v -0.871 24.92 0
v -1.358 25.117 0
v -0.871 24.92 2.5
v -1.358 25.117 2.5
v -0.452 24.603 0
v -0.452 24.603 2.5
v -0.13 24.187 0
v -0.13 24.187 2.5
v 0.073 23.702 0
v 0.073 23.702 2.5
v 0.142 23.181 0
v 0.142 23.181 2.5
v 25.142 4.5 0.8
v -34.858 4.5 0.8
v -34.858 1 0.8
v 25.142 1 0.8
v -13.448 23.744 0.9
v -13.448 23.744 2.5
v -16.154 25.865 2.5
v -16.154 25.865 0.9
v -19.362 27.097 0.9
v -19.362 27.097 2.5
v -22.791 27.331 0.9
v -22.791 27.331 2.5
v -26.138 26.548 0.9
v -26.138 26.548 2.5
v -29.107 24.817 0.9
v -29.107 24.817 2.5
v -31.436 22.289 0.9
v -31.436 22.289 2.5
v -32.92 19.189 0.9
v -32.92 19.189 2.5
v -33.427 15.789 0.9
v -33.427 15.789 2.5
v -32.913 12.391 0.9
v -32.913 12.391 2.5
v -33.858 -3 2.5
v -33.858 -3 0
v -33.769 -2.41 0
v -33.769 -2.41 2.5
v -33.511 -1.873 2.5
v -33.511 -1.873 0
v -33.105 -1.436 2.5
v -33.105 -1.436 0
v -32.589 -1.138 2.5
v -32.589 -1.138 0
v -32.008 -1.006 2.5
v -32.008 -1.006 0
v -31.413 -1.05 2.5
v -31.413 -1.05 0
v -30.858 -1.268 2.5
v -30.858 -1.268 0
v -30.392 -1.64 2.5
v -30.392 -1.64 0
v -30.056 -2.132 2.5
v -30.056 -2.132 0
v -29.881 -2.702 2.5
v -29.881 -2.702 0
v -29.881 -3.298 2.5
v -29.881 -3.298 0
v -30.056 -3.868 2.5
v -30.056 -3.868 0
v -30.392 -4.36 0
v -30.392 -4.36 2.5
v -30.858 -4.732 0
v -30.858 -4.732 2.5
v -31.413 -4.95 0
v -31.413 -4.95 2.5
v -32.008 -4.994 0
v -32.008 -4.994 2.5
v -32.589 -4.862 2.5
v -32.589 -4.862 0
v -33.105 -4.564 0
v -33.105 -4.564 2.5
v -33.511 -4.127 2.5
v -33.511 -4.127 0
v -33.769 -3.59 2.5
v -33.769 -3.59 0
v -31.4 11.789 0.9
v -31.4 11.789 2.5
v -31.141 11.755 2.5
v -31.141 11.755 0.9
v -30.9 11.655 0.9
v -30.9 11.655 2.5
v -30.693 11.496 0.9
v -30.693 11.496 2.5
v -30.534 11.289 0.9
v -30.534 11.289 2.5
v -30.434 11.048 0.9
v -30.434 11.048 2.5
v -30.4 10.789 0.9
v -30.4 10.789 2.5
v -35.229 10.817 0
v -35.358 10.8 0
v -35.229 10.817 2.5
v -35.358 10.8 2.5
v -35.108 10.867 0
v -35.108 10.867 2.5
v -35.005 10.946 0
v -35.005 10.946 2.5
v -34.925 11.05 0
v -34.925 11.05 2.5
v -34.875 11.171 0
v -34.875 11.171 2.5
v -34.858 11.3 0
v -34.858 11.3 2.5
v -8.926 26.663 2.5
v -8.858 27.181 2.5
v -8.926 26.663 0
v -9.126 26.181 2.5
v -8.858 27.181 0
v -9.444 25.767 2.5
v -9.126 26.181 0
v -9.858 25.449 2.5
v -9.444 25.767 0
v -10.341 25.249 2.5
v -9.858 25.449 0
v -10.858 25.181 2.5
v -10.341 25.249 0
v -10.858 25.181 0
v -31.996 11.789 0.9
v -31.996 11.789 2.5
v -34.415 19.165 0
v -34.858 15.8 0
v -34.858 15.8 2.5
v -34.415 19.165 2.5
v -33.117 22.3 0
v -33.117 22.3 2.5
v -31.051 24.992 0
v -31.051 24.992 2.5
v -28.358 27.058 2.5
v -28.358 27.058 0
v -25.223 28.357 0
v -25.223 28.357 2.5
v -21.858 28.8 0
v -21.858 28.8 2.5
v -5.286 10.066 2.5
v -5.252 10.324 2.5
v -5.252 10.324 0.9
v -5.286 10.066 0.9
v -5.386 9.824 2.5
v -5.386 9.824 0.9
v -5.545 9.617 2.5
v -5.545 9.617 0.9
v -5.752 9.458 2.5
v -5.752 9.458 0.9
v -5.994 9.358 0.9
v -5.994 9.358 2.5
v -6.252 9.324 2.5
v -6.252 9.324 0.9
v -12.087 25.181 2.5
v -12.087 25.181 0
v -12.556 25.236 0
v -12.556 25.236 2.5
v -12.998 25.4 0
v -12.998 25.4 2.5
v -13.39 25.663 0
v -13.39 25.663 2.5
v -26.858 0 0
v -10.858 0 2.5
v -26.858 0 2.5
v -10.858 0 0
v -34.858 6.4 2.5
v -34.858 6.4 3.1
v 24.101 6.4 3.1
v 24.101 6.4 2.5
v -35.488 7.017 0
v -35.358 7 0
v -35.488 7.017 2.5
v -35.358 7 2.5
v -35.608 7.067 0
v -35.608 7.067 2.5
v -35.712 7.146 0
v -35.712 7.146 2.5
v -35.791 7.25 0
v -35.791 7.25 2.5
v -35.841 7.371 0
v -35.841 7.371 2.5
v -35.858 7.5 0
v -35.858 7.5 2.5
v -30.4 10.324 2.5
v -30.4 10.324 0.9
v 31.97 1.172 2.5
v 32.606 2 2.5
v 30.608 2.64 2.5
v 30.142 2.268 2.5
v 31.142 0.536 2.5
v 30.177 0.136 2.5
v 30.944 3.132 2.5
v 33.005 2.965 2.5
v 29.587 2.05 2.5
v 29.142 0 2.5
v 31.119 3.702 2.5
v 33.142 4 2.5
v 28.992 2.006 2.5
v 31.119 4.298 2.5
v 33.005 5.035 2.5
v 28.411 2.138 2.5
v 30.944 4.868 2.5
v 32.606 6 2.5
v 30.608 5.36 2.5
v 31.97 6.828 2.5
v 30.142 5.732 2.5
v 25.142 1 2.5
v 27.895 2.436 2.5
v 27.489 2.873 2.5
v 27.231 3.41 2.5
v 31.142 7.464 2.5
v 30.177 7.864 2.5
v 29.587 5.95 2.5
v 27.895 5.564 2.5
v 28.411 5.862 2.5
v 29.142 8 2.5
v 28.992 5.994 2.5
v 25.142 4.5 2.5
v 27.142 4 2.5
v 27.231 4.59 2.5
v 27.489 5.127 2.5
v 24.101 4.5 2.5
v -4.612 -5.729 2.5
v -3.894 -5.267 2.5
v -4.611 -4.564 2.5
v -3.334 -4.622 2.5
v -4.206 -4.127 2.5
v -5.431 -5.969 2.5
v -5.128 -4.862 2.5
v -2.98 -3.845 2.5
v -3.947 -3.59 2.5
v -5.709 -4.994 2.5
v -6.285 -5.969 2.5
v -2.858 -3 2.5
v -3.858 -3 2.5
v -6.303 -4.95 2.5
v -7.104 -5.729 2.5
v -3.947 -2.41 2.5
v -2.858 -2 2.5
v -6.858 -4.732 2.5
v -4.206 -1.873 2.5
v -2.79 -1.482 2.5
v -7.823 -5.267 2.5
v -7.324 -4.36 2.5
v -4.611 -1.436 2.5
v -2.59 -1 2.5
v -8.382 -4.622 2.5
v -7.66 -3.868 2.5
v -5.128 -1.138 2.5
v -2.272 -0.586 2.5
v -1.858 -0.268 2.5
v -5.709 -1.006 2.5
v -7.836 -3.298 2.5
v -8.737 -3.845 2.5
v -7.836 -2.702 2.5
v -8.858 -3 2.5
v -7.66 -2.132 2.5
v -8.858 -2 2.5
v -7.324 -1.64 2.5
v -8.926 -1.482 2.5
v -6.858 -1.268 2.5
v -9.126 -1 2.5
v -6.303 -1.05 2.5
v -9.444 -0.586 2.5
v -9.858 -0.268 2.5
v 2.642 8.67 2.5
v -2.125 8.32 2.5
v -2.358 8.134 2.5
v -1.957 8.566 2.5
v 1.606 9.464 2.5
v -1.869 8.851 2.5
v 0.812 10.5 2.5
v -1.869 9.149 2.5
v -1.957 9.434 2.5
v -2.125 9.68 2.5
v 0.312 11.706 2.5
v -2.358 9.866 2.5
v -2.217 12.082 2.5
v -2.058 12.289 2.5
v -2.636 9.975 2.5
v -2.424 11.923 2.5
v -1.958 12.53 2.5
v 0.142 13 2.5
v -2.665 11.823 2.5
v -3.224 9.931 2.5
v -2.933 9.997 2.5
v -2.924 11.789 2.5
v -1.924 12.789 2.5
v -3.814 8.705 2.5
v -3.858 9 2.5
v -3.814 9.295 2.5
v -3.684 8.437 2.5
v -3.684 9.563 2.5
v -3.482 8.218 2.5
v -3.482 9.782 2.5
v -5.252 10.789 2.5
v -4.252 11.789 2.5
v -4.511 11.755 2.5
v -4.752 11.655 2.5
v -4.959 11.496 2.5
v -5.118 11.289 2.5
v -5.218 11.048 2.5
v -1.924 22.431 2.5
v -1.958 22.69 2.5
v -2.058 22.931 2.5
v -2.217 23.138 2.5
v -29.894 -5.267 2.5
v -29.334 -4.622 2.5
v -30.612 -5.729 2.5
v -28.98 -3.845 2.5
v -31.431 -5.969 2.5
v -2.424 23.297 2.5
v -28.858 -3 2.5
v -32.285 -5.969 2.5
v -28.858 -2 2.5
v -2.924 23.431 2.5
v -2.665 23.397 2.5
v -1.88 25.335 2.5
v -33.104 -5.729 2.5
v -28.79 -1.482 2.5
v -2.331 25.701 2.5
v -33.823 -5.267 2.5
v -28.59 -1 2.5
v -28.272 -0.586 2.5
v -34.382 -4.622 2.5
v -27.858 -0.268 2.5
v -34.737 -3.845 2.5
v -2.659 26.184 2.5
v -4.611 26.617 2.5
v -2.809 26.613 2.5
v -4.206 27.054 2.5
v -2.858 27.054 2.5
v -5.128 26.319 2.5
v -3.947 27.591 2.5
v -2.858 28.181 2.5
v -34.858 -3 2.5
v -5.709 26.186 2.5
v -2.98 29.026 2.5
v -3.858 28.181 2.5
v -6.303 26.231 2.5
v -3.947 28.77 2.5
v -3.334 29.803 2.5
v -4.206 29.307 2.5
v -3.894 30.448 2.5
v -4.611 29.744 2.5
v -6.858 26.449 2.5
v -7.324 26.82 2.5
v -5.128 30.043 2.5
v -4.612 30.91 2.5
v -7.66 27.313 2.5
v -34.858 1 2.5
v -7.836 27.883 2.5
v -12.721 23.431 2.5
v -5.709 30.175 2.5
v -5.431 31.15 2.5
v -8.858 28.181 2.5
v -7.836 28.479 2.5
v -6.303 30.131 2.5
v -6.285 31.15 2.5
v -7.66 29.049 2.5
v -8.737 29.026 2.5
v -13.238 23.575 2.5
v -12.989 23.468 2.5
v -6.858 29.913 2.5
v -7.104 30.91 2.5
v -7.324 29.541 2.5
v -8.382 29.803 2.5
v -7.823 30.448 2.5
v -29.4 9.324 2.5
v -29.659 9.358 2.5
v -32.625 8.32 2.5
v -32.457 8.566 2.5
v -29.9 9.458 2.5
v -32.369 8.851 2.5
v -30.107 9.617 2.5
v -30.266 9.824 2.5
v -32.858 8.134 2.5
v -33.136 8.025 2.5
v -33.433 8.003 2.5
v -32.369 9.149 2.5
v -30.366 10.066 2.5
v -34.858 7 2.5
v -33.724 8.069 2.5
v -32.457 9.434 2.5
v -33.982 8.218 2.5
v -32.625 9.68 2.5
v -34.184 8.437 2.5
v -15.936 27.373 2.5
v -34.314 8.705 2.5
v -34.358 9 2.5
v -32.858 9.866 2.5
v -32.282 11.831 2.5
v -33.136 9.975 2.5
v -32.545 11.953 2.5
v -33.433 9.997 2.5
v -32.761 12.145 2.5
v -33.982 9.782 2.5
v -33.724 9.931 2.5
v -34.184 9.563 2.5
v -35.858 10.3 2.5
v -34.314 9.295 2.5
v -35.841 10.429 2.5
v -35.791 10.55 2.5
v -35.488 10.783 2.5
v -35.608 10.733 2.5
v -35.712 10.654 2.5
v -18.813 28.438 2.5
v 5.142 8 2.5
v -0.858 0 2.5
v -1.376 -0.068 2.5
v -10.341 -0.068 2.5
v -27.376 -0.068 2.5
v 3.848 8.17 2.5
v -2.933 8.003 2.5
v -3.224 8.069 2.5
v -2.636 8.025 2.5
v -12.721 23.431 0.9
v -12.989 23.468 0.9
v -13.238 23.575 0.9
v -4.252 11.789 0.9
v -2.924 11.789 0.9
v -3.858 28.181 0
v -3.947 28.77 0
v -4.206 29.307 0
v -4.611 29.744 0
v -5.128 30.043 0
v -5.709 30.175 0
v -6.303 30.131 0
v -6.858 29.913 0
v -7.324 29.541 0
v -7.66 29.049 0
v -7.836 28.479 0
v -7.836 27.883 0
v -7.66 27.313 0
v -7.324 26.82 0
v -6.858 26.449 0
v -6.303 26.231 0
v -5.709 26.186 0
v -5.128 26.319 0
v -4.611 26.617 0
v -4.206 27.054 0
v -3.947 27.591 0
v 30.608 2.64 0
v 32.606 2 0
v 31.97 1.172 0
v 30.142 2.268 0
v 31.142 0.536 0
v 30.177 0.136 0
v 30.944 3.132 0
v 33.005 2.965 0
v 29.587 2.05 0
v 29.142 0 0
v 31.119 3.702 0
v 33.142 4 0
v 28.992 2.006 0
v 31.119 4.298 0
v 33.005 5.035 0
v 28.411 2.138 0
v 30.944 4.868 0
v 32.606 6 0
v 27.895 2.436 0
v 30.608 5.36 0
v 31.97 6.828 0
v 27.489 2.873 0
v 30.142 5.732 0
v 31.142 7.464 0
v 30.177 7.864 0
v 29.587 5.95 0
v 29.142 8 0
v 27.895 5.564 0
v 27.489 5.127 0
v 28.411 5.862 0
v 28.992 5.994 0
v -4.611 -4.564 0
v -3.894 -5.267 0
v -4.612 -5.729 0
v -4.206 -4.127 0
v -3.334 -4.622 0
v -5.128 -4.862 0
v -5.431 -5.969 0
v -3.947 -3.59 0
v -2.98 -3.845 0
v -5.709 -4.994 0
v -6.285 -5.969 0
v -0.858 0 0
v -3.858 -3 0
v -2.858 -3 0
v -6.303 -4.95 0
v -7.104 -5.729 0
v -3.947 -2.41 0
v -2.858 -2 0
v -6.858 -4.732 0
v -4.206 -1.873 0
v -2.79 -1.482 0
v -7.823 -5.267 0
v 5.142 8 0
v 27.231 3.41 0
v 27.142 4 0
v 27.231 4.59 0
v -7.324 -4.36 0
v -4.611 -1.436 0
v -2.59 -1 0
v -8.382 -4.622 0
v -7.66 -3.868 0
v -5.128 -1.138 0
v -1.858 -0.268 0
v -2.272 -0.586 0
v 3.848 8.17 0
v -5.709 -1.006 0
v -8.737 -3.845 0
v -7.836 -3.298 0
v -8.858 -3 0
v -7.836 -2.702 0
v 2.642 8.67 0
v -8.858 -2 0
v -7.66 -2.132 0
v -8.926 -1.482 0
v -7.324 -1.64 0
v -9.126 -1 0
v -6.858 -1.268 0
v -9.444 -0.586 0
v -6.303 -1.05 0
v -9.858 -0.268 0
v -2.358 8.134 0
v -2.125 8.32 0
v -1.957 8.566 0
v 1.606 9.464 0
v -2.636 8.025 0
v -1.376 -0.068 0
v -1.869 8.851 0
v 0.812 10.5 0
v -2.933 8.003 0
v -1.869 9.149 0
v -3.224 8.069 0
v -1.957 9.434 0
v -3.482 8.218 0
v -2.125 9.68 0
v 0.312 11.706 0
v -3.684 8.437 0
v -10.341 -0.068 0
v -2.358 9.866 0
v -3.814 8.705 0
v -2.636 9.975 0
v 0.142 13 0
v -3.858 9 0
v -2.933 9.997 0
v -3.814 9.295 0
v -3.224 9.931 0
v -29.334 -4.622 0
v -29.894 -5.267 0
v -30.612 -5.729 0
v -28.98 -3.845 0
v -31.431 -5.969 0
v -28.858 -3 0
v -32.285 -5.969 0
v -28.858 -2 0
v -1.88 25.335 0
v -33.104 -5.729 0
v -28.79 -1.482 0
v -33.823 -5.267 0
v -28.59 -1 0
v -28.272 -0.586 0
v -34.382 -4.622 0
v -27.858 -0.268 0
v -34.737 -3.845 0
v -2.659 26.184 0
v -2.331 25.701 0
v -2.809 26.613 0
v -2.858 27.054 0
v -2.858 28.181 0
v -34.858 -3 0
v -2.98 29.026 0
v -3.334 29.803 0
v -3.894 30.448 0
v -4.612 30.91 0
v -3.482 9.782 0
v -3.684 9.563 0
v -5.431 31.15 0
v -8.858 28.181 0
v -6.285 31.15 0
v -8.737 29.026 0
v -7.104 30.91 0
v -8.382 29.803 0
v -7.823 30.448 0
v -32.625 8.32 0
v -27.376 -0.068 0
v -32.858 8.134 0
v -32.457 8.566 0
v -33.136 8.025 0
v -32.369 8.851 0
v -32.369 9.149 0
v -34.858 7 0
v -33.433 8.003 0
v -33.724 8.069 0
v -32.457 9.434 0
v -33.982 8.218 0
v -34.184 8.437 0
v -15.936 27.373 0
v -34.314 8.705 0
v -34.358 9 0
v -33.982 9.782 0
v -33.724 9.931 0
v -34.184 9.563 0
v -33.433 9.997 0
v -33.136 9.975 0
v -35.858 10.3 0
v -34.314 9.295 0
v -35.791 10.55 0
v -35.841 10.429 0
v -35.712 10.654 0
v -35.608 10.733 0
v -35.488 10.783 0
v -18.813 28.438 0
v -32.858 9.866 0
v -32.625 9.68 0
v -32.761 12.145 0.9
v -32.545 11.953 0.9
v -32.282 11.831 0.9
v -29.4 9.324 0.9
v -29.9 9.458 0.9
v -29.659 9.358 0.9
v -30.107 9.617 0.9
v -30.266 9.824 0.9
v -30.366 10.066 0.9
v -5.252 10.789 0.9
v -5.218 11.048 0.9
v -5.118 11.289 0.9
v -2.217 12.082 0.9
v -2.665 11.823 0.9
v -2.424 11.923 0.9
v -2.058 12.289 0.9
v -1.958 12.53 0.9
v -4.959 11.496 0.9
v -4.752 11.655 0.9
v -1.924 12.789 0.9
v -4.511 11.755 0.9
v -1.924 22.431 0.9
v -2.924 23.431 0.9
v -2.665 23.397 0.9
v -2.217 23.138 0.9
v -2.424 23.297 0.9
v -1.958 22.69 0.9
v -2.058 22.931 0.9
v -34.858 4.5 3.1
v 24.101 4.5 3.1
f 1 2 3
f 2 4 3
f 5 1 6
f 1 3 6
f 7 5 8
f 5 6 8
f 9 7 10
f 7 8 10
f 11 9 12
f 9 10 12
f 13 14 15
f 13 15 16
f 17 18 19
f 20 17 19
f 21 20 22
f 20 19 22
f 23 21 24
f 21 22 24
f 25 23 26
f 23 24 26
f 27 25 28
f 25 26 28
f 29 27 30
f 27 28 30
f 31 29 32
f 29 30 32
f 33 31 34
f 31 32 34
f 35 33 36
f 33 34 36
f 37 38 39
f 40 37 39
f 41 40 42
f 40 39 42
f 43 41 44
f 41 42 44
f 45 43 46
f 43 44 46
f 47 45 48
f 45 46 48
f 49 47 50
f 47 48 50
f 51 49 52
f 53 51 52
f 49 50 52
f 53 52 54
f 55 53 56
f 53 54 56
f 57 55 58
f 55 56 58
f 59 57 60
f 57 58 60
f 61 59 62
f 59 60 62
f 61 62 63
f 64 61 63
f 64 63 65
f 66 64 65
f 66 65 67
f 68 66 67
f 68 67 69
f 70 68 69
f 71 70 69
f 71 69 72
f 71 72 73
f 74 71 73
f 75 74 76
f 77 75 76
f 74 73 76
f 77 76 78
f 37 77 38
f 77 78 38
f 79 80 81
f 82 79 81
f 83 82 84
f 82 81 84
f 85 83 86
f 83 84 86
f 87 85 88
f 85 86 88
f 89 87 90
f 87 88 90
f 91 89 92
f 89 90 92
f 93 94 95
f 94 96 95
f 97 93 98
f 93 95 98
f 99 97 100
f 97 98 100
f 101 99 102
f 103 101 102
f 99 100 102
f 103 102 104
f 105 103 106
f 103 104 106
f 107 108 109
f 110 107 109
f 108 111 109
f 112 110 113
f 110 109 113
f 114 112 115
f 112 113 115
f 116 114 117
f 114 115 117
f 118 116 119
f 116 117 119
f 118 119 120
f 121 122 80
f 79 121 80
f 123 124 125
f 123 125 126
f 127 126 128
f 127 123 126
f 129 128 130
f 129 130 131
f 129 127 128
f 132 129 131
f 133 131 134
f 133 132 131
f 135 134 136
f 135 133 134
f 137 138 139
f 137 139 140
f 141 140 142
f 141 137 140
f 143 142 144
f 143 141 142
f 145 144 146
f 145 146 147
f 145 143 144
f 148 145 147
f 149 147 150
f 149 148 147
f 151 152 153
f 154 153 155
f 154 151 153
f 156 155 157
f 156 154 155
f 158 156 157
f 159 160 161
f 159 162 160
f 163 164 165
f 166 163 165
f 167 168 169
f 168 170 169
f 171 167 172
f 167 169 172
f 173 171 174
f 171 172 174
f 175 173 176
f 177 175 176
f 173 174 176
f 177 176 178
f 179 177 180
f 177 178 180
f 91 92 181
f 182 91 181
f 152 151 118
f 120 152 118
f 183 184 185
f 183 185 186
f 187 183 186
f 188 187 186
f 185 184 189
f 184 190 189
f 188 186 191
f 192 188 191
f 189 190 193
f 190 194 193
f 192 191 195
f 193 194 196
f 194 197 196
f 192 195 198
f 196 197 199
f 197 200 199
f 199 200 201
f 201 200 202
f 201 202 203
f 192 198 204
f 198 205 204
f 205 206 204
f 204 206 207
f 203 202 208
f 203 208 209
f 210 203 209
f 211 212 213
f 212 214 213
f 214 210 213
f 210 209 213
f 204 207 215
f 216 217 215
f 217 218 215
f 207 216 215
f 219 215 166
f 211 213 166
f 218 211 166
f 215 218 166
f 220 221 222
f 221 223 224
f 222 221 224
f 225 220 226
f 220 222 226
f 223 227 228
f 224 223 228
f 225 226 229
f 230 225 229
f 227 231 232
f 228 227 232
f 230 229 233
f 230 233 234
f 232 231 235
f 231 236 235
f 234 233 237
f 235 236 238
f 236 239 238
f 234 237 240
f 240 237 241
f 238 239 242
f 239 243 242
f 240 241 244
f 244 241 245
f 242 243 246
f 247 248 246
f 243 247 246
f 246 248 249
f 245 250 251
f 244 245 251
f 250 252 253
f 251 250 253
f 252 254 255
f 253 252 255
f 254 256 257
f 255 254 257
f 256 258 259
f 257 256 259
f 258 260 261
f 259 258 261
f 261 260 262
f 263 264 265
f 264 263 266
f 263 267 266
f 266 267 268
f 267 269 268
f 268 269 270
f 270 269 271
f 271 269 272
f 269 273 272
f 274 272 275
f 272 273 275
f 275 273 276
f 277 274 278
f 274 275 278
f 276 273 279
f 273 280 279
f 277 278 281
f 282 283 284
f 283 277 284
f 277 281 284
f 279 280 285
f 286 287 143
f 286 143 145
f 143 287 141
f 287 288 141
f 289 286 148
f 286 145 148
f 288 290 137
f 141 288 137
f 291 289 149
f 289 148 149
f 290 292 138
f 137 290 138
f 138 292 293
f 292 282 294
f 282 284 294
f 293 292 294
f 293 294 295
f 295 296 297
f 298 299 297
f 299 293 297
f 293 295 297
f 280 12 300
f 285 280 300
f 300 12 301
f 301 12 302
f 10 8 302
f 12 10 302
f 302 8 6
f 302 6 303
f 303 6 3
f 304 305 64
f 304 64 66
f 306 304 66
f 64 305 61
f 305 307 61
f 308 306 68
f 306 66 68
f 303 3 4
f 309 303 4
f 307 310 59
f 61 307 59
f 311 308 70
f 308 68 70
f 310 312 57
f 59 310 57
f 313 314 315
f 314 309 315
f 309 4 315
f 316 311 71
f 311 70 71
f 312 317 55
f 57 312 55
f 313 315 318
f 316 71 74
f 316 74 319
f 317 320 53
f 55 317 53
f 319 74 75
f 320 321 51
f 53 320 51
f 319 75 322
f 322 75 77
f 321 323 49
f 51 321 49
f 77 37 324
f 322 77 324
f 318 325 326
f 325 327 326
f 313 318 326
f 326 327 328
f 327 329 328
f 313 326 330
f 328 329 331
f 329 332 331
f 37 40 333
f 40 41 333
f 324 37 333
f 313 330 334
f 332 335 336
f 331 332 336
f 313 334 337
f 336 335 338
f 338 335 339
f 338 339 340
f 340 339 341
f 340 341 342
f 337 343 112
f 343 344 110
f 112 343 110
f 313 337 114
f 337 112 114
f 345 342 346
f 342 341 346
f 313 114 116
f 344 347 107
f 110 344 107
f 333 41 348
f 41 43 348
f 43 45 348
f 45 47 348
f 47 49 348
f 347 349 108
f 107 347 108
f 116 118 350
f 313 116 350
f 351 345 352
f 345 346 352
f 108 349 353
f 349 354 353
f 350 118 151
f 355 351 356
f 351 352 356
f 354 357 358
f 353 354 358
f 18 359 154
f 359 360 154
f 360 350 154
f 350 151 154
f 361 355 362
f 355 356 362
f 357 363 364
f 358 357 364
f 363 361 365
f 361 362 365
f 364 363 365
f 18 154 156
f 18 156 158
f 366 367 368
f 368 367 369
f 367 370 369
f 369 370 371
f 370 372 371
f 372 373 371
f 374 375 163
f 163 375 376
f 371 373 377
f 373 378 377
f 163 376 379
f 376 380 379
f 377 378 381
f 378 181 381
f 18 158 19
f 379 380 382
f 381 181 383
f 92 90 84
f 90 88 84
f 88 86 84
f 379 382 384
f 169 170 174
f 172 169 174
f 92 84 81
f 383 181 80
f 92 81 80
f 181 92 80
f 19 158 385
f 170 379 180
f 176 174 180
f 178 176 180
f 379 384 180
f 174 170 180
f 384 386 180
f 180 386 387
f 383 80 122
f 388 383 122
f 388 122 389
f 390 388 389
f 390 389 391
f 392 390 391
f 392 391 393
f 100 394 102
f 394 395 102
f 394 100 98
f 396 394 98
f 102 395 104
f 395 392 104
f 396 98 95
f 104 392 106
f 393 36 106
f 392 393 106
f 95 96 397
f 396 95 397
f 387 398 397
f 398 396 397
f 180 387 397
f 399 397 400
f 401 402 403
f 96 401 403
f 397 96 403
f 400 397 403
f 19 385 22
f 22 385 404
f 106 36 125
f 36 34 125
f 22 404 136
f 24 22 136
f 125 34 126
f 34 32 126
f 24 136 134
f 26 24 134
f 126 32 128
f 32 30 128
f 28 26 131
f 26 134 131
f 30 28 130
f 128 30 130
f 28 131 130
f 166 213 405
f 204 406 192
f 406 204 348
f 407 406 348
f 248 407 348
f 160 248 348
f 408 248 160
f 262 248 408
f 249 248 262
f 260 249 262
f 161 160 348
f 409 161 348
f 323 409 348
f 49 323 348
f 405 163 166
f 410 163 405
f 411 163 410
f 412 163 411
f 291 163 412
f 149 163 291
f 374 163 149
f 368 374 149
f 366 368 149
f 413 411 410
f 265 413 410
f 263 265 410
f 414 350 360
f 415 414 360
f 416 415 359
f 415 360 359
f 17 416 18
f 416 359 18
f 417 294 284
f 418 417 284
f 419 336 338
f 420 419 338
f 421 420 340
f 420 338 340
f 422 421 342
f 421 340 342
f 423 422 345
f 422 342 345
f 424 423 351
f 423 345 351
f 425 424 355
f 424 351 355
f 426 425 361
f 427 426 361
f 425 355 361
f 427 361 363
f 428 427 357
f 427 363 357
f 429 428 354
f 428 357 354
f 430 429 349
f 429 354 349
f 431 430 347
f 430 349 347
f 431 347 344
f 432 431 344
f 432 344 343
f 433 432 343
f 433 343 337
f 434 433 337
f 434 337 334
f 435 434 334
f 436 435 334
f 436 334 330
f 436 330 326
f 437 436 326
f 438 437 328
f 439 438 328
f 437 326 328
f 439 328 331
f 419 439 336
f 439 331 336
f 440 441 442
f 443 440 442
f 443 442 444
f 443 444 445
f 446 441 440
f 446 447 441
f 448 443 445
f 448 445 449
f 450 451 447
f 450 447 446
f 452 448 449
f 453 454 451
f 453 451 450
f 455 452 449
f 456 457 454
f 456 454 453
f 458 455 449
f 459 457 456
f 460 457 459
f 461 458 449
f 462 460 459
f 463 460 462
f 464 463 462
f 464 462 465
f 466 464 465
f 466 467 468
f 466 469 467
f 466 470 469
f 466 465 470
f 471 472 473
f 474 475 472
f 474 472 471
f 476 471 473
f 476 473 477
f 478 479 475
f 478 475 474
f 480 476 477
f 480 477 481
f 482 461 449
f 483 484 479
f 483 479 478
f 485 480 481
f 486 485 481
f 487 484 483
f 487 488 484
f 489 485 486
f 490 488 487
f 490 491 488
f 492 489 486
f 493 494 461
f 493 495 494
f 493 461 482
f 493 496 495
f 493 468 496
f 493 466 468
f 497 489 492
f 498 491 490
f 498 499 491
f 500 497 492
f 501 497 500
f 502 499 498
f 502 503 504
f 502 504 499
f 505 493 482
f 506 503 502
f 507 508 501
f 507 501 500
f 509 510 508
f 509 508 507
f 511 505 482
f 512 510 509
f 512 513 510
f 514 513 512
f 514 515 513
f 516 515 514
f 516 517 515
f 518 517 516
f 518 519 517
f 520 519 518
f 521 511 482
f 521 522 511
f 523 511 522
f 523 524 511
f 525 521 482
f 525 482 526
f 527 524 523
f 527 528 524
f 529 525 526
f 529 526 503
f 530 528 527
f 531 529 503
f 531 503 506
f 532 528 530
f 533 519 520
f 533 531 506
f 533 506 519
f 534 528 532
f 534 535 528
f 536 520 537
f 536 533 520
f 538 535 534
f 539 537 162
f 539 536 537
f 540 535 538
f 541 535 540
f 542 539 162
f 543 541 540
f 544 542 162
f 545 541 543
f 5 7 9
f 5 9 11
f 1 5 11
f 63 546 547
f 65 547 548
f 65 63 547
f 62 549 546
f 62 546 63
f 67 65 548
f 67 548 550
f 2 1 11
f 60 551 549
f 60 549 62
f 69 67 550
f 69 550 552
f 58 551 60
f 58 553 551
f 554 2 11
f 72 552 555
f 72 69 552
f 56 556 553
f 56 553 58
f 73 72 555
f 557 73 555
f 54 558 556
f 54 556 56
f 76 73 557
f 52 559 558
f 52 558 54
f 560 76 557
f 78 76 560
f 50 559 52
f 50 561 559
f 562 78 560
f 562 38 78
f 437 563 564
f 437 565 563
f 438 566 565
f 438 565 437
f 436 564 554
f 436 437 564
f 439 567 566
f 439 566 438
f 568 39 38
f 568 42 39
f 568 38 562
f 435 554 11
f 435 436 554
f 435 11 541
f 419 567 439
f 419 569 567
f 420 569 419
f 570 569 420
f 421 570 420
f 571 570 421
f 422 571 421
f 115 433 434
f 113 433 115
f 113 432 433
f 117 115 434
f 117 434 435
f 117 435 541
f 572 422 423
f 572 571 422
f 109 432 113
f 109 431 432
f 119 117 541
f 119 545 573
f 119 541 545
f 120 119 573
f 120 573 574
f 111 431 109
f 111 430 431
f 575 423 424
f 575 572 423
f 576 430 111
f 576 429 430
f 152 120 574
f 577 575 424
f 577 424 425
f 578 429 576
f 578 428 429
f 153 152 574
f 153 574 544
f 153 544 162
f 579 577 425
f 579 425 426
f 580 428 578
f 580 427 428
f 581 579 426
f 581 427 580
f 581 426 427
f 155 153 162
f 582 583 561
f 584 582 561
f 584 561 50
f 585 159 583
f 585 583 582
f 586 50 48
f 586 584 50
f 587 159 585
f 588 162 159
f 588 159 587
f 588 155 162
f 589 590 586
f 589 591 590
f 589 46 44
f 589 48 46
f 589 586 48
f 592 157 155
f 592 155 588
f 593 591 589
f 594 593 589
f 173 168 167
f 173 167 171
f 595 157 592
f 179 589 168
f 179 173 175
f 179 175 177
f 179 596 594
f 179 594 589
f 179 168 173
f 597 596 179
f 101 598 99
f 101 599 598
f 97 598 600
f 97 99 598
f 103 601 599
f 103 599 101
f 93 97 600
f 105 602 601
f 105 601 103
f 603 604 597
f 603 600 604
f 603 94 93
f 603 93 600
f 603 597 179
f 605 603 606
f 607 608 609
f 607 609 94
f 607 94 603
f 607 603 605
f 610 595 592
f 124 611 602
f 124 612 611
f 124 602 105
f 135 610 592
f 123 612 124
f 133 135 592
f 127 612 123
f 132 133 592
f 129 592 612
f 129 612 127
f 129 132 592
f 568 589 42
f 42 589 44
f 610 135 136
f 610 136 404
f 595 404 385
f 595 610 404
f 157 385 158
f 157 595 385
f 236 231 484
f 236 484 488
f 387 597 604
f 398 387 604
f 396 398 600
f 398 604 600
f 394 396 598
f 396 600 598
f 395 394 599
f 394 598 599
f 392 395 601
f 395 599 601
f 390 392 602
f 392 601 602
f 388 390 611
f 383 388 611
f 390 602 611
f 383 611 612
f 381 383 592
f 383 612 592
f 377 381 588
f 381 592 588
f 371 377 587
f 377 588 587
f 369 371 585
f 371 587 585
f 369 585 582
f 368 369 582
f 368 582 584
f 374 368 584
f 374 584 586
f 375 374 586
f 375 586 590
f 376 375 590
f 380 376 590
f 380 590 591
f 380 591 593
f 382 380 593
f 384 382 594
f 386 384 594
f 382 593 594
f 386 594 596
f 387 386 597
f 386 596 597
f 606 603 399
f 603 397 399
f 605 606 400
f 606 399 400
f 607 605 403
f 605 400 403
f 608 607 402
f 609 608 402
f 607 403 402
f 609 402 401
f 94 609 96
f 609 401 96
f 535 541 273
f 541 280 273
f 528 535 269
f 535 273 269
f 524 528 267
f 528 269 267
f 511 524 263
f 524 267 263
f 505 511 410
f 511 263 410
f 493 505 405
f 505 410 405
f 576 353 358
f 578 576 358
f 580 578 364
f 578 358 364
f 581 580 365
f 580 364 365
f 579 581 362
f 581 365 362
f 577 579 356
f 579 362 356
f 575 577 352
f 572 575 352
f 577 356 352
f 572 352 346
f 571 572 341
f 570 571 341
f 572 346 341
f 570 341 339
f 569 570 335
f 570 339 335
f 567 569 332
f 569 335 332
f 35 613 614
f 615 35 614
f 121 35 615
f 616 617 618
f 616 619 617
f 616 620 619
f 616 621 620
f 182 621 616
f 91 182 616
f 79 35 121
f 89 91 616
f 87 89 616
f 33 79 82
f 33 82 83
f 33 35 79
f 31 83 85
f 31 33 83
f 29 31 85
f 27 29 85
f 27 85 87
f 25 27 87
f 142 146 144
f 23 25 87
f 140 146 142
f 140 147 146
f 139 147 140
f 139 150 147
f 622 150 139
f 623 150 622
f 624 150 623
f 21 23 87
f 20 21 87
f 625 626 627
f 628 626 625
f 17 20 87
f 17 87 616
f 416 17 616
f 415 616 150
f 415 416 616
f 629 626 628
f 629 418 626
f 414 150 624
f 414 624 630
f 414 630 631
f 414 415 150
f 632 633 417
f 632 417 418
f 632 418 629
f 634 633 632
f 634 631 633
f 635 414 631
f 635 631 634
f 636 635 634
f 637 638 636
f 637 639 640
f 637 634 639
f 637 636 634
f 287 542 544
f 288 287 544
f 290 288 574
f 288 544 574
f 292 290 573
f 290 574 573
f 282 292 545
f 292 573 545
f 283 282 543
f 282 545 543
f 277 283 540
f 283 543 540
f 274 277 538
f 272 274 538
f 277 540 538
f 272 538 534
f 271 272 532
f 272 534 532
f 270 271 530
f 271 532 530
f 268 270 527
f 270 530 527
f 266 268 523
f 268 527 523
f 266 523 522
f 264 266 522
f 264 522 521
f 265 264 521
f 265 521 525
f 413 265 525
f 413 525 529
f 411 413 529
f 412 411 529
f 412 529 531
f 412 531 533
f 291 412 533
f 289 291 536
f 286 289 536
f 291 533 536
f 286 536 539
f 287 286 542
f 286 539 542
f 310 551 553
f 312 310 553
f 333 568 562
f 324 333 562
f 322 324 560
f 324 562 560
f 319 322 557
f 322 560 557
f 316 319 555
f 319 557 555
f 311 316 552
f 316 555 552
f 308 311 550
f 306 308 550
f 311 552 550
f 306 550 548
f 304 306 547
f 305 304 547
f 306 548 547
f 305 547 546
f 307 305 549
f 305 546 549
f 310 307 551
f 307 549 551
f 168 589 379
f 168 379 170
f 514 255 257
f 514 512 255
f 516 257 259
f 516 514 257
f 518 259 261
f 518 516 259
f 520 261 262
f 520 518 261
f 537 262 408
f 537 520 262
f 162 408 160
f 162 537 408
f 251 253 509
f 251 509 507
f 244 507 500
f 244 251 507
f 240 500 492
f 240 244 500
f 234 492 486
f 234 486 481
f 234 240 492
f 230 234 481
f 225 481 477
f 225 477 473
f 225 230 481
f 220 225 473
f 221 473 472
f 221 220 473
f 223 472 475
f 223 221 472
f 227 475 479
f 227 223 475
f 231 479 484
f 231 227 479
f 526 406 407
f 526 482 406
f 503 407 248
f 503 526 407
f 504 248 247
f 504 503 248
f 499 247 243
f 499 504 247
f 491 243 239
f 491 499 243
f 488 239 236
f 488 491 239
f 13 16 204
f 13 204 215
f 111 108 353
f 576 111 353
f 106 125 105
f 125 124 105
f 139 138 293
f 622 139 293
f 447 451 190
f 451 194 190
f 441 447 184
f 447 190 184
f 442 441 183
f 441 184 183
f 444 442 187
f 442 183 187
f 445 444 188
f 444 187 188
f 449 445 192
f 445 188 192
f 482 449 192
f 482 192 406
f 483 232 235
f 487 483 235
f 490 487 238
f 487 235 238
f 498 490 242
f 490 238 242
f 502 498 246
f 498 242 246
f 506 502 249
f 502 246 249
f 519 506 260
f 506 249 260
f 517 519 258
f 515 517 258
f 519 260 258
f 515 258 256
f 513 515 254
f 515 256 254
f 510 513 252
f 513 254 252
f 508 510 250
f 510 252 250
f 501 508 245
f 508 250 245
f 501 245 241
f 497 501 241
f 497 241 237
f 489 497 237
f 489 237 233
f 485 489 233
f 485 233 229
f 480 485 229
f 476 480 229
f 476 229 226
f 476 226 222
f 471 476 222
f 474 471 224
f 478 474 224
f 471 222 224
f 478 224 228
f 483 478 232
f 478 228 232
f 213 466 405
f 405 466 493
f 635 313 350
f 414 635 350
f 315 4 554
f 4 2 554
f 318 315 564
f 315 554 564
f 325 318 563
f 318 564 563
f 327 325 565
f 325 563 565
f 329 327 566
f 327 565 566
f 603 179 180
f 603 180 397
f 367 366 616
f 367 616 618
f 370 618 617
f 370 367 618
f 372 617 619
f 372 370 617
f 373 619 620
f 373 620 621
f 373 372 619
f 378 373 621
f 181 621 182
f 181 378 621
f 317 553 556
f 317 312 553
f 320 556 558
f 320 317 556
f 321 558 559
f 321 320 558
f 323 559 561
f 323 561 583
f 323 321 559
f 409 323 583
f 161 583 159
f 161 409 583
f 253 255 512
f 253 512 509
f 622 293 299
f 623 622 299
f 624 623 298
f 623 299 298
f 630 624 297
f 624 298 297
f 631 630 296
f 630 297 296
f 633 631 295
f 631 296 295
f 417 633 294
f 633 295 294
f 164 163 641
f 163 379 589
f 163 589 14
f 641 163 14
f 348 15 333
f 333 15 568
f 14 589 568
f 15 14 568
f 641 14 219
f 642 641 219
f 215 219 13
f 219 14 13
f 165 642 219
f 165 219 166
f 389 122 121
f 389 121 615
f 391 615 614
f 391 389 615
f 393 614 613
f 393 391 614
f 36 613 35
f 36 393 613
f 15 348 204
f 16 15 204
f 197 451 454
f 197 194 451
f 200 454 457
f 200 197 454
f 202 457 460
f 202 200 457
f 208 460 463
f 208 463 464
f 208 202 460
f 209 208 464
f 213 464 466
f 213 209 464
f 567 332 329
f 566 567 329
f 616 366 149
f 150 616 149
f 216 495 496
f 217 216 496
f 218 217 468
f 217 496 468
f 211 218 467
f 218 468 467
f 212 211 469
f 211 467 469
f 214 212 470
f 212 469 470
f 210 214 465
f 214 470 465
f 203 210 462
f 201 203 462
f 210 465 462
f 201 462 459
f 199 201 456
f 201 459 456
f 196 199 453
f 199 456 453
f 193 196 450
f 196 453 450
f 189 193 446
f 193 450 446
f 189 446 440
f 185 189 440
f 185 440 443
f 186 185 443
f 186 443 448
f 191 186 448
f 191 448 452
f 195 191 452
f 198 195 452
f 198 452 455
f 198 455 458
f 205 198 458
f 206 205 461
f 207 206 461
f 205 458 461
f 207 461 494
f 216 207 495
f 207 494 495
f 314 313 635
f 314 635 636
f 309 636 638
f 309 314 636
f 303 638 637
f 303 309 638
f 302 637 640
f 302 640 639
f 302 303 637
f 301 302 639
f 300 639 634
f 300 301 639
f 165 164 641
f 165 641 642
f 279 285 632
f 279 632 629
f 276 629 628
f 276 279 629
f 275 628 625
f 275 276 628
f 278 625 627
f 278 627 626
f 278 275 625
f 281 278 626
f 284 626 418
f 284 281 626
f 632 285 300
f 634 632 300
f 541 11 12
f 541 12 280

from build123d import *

# Parameters (mm, degrees)
AUFSATZ_LINEAR_AUSTRAGEN1_DEPTH = 2.5
VERRUNDUNG1_R                   = 2
VERRUNDUNG2_R                   = 5
SKIZZE2_W                       = 60
SKIZZE2_H                       = 6
SCHNITT_LINEAR_AUSTRAGEN1_DEPTH = 1.7
SKIZZE3_W                       = 60
SKIZZE3_H                       = 2.5
AUFSATZ_LINEAR_AUSTRAGEN3_DEPTH = 2.3
SKIZZE5_R                       = 1
SCHNITT_LINEAR_AUSTRAGEN3_DEPTH = 2.5
SKIZZE6_R                       = 1
SCHNITT_LINEAR_AUSTRAGEN4_DEPTH = 2.5
SKIZZE7_W                       = 8
SKIZZE7_H                       = 8
SKIZZE7_R                       = 2
AUFSATZ_LINEAR_AUSTRAGEN4_DEPTH = 2.5
VERRUNDUNG3_R                   = 4
SKIZZE8_W                       = 1.041077985
SKIZZE8_H                       = 2.5
SCHNITT_LINEAR_AUSTRAGEN5_DEPTH = 0.6
SKIZZE10_W                      = 58.958922015
SKIZZE10_H                      = 0.6
SCHNITT_LINEAR_AUSTRAGEN6_DEPTH = 0.6
SCHNITT_LINEAR_AUSTRAGEN7_DEPTH = 1.6
SKIZZESTUTZENINNEN_R            = 2
AUFSATZ_LINEAR_AUSTRAGEN5_DEPTH = 2.5
VERRUNDUNG4_R                   = 1
VERRUNDUNG5_R                   = 2
VERRUNDUNG6_R                   = 2
SKIZZE12_R                      = 2
AUFSATZ_LINEAR_AUSTRAGEN6_DEPTH = 2.5
VERRUNDUNG7_R                   = 2
SKIZZE13_W                      = 1
SKIZZE13_H                      = 3.8
AUFSATZ_LINEAR_AUSTRAGEN7_DEPTH = 2.5
VERRUNDUNG9_R                   = 0.5


# Some blends are built 0.0001 mm under size
with BuildPart() as part:
    # d-body → Aufsatz-Linear austragen1 (new body)
    with BuildSketch(Plane.XY):
        with BuildLine():
            Line((25.141766665, 0), (-34.858233335, 0))
            Line((-34.858233335, 0), (-34.858233335, 15.8))
            ThreePointArc((-34.858233335, 15.8), (-31.050621491, 24.992388155), (-21.858233335, 28.8))
            ThreePointArc((-21.858233335, 28.8), (-17.008017348, 27.861318538), (-12.858233335, 25.18083152))
            Line((-12.858233335, 25.18083152), (0.141766665, 25.18083152))
            Line((0.141766665, 25.18083152), (0.141766665, 8))
            Line((0.141766665, 8), (25.141766665, 8))
            Line((25.141766665, 8), (25.141766665, 0))
        make_face()
    extrude(amount=AUFSATZ_LINEAR_AUSTRAGEN1_DEPTH)

    # Verrundung1
    verrundung1_edges = [part.edges().sort_by_distance(p)[0] for p in [
        (0.141766665, 25.18083152, 1.25),
    ]]
    fillet(verrundung1_edges, radius=VERRUNDUNG1_R)

    # Verrundung2
    verrundung2_edges = [part.edges().sort_by_distance(p)[0] for p in [
        (0.141766665, 8, 1.25),
    ]]
    fillet(verrundung2_edges, radius=VERRUNDUNG2_R)

    # Skizze2 → Schnitt-Linear austragen1 (cut)
    with BuildSketch(Plane.XY.offset(2.5)):
        with Locations((-4.858233335, 4)):
            Rectangle(SKIZZE2_W, SKIZZE2_H)
    extrude(amount=-SCHNITT_LINEAR_AUSTRAGEN1_DEPTH, mode=Mode.SUBTRACT)

    # Skizze3 → Aufsatz-Linear austragen3 (add)
    with BuildSketch(Plane.XY.offset(0.8)):
        with Locations((-4.858233335, 5.75)):
            Rectangle(SKIZZE3_W, SKIZZE3_H)
    extrude(amount=AUFSATZ_LINEAR_AUSTRAGEN3_DEPTH)

    # Skizze5 → Schnitt-Linear austragen3 (cut)
    with BuildSketch(Plane(origin=(0, 0, 0), x_dir=(-1, 0, 0), z_dir=(0, 0, -1))):
        with Locations((33.358233335, 9)):
            Circle(SKIZZE5_R)
    extrude(amount=-SCHNITT_LINEAR_AUSTRAGEN3_DEPTH, mode=Mode.SUBTRACT)

    # Skizze6 → Schnitt-Linear austragen4 (cut)
    with BuildSketch(Plane(origin=(0, 0, 0), x_dir=(-1, 0, 0), z_dir=(0, 0, -1))):
        with Locations((2.858233335, 9)):
            Circle(SKIZZE6_R)
    extrude(amount=-SCHNITT_LINEAR_AUSTRAGEN4_DEPTH, mode=Mode.SUBTRACT)

    # Skizze7 → Aufsatz-Linear austragen4 (add)
    with BuildSketch(Plane(origin=(0, 0, 0), x_dir=(-1, 0, 0), z_dir=(0, 0, -1))):
        with Locations((-29.141766665, 4)):
            Rectangle(SKIZZE7_W, SKIZZE7_H)
        with Locations((-29.141766665, 4)):
            Circle(SKIZZE7_R, mode=Mode.SUBTRACT)
    extrude(amount=-AUFSATZ_LINEAR_AUSTRAGEN4_DEPTH)

    # Verrundung3
    verrundung3_edges = [part.edges().sort_by_distance(p)[0] for p in [
        (33.141766665, 0, 1.25),
        (33.141766665, 8, 1.25),
    ]]
    fillet(verrundung3_edges, radius=VERRUNDUNG3_R - 0.0001)  # a hair under: the kernel refuses the full size

    # Skizze8 → Schnitt-Linear austragen5 (cut)
    with BuildSketch(Plane.XY.offset(3.1)):
        with Locations((24.621227673, 5.75)):
            Rectangle(SKIZZE8_W, SKIZZE8_H)
    extrude(amount=-SCHNITT_LINEAR_AUSTRAGEN5_DEPTH, mode=Mode.SUBTRACT)

    # Skizze10 → Schnitt-Linear austragen6 (cut)
    with BuildSketch(Plane.XY.offset(3.1)):
        with Locations((-5.378772328, 6.7)):
            Rectangle(SKIZZE10_W, SKIZZE10_H)
    extrude(amount=-SCHNITT_LINEAR_AUSTRAGEN6_DEPTH, mode=Mode.SUBTRACT)

    # Skizze11 → Schnitt-Linear austragen7 (cut)
    with BuildSketch(Plane.XY.offset(2.5)):
        with BuildLine():
            Line((-30.399734465, 9.324335962), (-5.252382746, 9.324335962))
            Line((-5.252382746, 9.324335962), (-5.252382746, 11.789002727))
            Line((-5.252382746, 11.789002727), (-1.923745725, 11.789002727))
            Line((-1.923745725, 11.789002727), (-1.923745725, 23.431190429))
            Line((-1.923745725, 23.431190429), (-13.163081736, 23.431190429))
            ThreePointArc((-13.163081736, 23.431190429), (-27.503142881, 25.898303071), (-32.913464689, 12.390808249))
            Line((-32.913464689, 12.390808249), (-32.913464689, 11.789002727))
            Line((-32.913464689, 11.789002727), (-30.399734465, 11.789002727))
            Line((-30.399734465, 11.789002727), (-30.399734465, 9.324335962))
        make_face()
    extrude(amount=-SCHNITT_LINEAR_AUSTRAGEN7_DEPTH, mode=Mode.SUBTRACT)

    # SkizzeStutzenInnen → Aufsatz-Linear austragen5 (add)
    # profile 1 of 2: a face of its own
    with BuildSketch(Plane.XY.offset(2.5)):
        with BuildLine():
            Line((-8.858233335, 25.18083152), (-8.858233335, 28.18083152))
            ThreePointArc((-8.858233335, 28.18083152), (-5.858233335, 31.18083152), (-2.858233335, 28.18083152))
            Line((-2.858233335, 28.18083152), (-2.858233335, 25.18083152))
            Line((-2.858233335, 25.18083152), (-8.858233335, 25.18083152))
        make_face()
        with Locations((-5.858233335, 28.18083152)):
            Circle(SKIZZESTUTZENINNEN_R, mode=Mode.SUBTRACT)
    # profile 2 of 2: a face of its own
    with BuildSketch(Plane.XY.offset(2.5)):
        with BuildLine():
            Line((-8.858233335, 0), (-8.858233335, -3))
            ThreePointArc((-8.858233335, -3), (-5.858233335, -6), (-2.858233335, -3))
            Line((-2.858233335, -3), (-2.858233335, 0))
            Line((-2.858233335, 0), (-8.858233335, 0))
        make_face()
        with Locations((-5.858233335, -3)):
            Circle(SKIZZESTUTZENINNEN_R, mode=Mode.SUBTRACT)
    extrude(amount=-AUFSATZ_LINEAR_AUSTRAGEN5_DEPTH)

    # Verrundung4
    # the kernel refuses this fillet: 1 mm, written as the material it adds along each edge
    with BuildSketch(Plane(origin=(-1.923745725, 23.431190429, 2.5), x_dir=(-1, 0, 0), z_dir=(0, 0, -1)), Plane(origin=(-1.923745725, 11.789002727, 2.5), x_dir=(0, 1, 0), z_dir=(0, 0, -1)), Plane(origin=(-5.252382746, 9.324335962, 2.5), x_dir=(0, 1, 0), z_dir=(0, 0, -1))) as verrundung4_piece_1:
        with BuildLine():
            CenterArc((VERRUNDUNG4_R, -VERRUNDUNG4_R), VERRUNDUNG4_R, 90, 90)
            Line((0, -VERRUNDUNG4_R), (0, 0))
            Line((0, 0), (VERRUNDUNG4_R, 0))
        make_face()
    extrude(amount=1.6)
    with BuildSketch(Plane(origin=(-32.913464689, 11.789002727, 2.5), x_dir=(1, 0, 0), z_dir=(0, 0, -1))) as verrundung4_piece_2:
        with BuildLine():
            CenterArc((0.917301018, -1), VERRUNDUNG4_R, 90, 66.534645017)
            Line((0, -0.601805522), (0, 0))
            Line((0, 0), (0.917301018, 0))
        make_face()
    extrude(amount=1.6)
    with BuildSketch(Plane(origin=(-30.399734465, 9.324335962, 2.5), x_dir=(0, 1, 0), z_dir=(0, 0, -1))) as verrundung4_piece_3:
        with BuildLine():
            CenterArc((VERRUNDUNG4_R, VERRUNDUNG4_R), VERRUNDUNG4_R, 180, 90)
            Line((0, VERRUNDUNG4_R), (0, 0))
            Line((0, 0), (VERRUNDUNG4_R, 0))
        make_face()
    extrude(amount=1.6)
    # the kernel refuses this fillet: 1 mm, written as the material it takes off along each edge
    with BuildSketch(Plane(origin=(-13.163081736, 23.431190429, 3.604131537), x_dir=(1, 0, 0), z_dir=(0, 0, -1))) as verrundung4_2_piece_1:
        with BuildLine():
            CenterArc((0.441652615, -1), VERRUNDUNG4_R, 90, 46.62999375)
            ThreePointArc((-0.28528164, -0.313292938), (-0.141206384, -0.157952653), (0, 0))
            Line((0, 0), (0.441652615, 0))
        make_face()
    extrude(amount=2.704131537, mode=Mode.SUBTRACT)
    with BuildSketch(Plane(origin=(-30.399734465, 11.789002727, 5), x_dir=(0, -1, 0), z_dir=(0, 0, -1))) as verrundung4_2_piece_2:
        with BuildLine():
            CenterArc((VERRUNDUNG4_R, VERRUNDUNG4_R), VERRUNDUNG4_R, 180, 90)
            Line((0, VERRUNDUNG4_R), (0, 0))
            Line((0, 0), (VERRUNDUNG4_R, 0))
        make_face()
    extrude(amount=4.1, mode=Mode.SUBTRACT)
    with BuildSketch(Plane(origin=(-5.252382746, 11.789002727, 5), x_dir=(0, -1, 0), z_dir=(0, 0, -1))) as verrundung4_2_piece_3:
        with BuildLine():
            CenterArc((VERRUNDUNG4_R, -VERRUNDUNG4_R), VERRUNDUNG4_R, 90, 90)
            Line((0, -VERRUNDUNG4_R), (0, 0))
            Line((0, 0), (VERRUNDUNG4_R, 0))
        make_face()
    extrude(amount=4.1, mode=Mode.SUBTRACT)

    # Verrundung5
    verrundung5_edges = [part.edges().sort_by_distance(p)[0] for p in [
        (-8.858233335, 0, 1.25),
        (-2.858233335, 0, 1.25),
        (-2.858233335, 25.18083152, 1.25),
        (-8.858233335, 25.18083152, 1.25),
    ]]
    fillet(verrundung5_edges, radius=VERRUNDUNG5_R)

    # Verrundung6
    verrundung6_edges = [part.edges().sort_by_distance(p)[0] for p in [
        (-12.858233335, 25.18083152, 1.25),
    ]]
    fillet(verrundung6_edges, radius=VERRUNDUNG6_R)

    # Skizze12 → Aufsatz-Linear austragen6 (add)
    with BuildSketch(Plane(origin=(0, 0, 0), x_dir=(-1, 0, 0), z_dir=(0, 0, -1))):
        with BuildLine():
            Line((28.858233335, 0), (34.858233335, 0))
            Line((34.858233335, 0), (34.858233335, -3))
            ThreePointArc((34.858233335, -3), (31.858233335, -6), (28.858233335, -3))
            Line((28.858233335, -3), (28.858233335, 0))
        make_face()
        with Locations((31.858233335, -3)):
            Circle(SKIZZE12_R, mode=Mode.SUBTRACT)
    extrude(amount=-AUFSATZ_LINEAR_AUSTRAGEN6_DEPTH)

    # Verrundung7
    verrundung7_edges = [part.edges().sort_by_distance(p)[0] for p in [
        (-28.858233335, 0, 1.25),
    ]]
    fillet(verrundung7_edges, radius=VERRUNDUNG7_R)

    # Skizze13 → Aufsatz-Linear austragen7 (add)
    with BuildSketch(Plane(origin=(0, 0, 0), x_dir=(-1, 0, 0), z_dir=(0, 0, -1))):
        with Locations((35.358233335, 8.9)):
            Rectangle(SKIZZE13_W, SKIZZE13_H)
    extrude(amount=-AUFSATZ_LINEAR_AUSTRAGEN7_DEPTH)

    # Verrundung9
    verrundung9_edges = [part.edges().sort_by_distance(p)[0] for p in [
        (-34.858233335, 10.8, 1.25),
        (-35.858233335, 7, 1.25),
        (-35.858233335, 10.8, 1.25),
    ]]
    fillet(verrundung9_edges, radius=VERRUNDUNG9_R - 0.0001)  # a hair under: the kernel refuses the full size


solid = part.part
